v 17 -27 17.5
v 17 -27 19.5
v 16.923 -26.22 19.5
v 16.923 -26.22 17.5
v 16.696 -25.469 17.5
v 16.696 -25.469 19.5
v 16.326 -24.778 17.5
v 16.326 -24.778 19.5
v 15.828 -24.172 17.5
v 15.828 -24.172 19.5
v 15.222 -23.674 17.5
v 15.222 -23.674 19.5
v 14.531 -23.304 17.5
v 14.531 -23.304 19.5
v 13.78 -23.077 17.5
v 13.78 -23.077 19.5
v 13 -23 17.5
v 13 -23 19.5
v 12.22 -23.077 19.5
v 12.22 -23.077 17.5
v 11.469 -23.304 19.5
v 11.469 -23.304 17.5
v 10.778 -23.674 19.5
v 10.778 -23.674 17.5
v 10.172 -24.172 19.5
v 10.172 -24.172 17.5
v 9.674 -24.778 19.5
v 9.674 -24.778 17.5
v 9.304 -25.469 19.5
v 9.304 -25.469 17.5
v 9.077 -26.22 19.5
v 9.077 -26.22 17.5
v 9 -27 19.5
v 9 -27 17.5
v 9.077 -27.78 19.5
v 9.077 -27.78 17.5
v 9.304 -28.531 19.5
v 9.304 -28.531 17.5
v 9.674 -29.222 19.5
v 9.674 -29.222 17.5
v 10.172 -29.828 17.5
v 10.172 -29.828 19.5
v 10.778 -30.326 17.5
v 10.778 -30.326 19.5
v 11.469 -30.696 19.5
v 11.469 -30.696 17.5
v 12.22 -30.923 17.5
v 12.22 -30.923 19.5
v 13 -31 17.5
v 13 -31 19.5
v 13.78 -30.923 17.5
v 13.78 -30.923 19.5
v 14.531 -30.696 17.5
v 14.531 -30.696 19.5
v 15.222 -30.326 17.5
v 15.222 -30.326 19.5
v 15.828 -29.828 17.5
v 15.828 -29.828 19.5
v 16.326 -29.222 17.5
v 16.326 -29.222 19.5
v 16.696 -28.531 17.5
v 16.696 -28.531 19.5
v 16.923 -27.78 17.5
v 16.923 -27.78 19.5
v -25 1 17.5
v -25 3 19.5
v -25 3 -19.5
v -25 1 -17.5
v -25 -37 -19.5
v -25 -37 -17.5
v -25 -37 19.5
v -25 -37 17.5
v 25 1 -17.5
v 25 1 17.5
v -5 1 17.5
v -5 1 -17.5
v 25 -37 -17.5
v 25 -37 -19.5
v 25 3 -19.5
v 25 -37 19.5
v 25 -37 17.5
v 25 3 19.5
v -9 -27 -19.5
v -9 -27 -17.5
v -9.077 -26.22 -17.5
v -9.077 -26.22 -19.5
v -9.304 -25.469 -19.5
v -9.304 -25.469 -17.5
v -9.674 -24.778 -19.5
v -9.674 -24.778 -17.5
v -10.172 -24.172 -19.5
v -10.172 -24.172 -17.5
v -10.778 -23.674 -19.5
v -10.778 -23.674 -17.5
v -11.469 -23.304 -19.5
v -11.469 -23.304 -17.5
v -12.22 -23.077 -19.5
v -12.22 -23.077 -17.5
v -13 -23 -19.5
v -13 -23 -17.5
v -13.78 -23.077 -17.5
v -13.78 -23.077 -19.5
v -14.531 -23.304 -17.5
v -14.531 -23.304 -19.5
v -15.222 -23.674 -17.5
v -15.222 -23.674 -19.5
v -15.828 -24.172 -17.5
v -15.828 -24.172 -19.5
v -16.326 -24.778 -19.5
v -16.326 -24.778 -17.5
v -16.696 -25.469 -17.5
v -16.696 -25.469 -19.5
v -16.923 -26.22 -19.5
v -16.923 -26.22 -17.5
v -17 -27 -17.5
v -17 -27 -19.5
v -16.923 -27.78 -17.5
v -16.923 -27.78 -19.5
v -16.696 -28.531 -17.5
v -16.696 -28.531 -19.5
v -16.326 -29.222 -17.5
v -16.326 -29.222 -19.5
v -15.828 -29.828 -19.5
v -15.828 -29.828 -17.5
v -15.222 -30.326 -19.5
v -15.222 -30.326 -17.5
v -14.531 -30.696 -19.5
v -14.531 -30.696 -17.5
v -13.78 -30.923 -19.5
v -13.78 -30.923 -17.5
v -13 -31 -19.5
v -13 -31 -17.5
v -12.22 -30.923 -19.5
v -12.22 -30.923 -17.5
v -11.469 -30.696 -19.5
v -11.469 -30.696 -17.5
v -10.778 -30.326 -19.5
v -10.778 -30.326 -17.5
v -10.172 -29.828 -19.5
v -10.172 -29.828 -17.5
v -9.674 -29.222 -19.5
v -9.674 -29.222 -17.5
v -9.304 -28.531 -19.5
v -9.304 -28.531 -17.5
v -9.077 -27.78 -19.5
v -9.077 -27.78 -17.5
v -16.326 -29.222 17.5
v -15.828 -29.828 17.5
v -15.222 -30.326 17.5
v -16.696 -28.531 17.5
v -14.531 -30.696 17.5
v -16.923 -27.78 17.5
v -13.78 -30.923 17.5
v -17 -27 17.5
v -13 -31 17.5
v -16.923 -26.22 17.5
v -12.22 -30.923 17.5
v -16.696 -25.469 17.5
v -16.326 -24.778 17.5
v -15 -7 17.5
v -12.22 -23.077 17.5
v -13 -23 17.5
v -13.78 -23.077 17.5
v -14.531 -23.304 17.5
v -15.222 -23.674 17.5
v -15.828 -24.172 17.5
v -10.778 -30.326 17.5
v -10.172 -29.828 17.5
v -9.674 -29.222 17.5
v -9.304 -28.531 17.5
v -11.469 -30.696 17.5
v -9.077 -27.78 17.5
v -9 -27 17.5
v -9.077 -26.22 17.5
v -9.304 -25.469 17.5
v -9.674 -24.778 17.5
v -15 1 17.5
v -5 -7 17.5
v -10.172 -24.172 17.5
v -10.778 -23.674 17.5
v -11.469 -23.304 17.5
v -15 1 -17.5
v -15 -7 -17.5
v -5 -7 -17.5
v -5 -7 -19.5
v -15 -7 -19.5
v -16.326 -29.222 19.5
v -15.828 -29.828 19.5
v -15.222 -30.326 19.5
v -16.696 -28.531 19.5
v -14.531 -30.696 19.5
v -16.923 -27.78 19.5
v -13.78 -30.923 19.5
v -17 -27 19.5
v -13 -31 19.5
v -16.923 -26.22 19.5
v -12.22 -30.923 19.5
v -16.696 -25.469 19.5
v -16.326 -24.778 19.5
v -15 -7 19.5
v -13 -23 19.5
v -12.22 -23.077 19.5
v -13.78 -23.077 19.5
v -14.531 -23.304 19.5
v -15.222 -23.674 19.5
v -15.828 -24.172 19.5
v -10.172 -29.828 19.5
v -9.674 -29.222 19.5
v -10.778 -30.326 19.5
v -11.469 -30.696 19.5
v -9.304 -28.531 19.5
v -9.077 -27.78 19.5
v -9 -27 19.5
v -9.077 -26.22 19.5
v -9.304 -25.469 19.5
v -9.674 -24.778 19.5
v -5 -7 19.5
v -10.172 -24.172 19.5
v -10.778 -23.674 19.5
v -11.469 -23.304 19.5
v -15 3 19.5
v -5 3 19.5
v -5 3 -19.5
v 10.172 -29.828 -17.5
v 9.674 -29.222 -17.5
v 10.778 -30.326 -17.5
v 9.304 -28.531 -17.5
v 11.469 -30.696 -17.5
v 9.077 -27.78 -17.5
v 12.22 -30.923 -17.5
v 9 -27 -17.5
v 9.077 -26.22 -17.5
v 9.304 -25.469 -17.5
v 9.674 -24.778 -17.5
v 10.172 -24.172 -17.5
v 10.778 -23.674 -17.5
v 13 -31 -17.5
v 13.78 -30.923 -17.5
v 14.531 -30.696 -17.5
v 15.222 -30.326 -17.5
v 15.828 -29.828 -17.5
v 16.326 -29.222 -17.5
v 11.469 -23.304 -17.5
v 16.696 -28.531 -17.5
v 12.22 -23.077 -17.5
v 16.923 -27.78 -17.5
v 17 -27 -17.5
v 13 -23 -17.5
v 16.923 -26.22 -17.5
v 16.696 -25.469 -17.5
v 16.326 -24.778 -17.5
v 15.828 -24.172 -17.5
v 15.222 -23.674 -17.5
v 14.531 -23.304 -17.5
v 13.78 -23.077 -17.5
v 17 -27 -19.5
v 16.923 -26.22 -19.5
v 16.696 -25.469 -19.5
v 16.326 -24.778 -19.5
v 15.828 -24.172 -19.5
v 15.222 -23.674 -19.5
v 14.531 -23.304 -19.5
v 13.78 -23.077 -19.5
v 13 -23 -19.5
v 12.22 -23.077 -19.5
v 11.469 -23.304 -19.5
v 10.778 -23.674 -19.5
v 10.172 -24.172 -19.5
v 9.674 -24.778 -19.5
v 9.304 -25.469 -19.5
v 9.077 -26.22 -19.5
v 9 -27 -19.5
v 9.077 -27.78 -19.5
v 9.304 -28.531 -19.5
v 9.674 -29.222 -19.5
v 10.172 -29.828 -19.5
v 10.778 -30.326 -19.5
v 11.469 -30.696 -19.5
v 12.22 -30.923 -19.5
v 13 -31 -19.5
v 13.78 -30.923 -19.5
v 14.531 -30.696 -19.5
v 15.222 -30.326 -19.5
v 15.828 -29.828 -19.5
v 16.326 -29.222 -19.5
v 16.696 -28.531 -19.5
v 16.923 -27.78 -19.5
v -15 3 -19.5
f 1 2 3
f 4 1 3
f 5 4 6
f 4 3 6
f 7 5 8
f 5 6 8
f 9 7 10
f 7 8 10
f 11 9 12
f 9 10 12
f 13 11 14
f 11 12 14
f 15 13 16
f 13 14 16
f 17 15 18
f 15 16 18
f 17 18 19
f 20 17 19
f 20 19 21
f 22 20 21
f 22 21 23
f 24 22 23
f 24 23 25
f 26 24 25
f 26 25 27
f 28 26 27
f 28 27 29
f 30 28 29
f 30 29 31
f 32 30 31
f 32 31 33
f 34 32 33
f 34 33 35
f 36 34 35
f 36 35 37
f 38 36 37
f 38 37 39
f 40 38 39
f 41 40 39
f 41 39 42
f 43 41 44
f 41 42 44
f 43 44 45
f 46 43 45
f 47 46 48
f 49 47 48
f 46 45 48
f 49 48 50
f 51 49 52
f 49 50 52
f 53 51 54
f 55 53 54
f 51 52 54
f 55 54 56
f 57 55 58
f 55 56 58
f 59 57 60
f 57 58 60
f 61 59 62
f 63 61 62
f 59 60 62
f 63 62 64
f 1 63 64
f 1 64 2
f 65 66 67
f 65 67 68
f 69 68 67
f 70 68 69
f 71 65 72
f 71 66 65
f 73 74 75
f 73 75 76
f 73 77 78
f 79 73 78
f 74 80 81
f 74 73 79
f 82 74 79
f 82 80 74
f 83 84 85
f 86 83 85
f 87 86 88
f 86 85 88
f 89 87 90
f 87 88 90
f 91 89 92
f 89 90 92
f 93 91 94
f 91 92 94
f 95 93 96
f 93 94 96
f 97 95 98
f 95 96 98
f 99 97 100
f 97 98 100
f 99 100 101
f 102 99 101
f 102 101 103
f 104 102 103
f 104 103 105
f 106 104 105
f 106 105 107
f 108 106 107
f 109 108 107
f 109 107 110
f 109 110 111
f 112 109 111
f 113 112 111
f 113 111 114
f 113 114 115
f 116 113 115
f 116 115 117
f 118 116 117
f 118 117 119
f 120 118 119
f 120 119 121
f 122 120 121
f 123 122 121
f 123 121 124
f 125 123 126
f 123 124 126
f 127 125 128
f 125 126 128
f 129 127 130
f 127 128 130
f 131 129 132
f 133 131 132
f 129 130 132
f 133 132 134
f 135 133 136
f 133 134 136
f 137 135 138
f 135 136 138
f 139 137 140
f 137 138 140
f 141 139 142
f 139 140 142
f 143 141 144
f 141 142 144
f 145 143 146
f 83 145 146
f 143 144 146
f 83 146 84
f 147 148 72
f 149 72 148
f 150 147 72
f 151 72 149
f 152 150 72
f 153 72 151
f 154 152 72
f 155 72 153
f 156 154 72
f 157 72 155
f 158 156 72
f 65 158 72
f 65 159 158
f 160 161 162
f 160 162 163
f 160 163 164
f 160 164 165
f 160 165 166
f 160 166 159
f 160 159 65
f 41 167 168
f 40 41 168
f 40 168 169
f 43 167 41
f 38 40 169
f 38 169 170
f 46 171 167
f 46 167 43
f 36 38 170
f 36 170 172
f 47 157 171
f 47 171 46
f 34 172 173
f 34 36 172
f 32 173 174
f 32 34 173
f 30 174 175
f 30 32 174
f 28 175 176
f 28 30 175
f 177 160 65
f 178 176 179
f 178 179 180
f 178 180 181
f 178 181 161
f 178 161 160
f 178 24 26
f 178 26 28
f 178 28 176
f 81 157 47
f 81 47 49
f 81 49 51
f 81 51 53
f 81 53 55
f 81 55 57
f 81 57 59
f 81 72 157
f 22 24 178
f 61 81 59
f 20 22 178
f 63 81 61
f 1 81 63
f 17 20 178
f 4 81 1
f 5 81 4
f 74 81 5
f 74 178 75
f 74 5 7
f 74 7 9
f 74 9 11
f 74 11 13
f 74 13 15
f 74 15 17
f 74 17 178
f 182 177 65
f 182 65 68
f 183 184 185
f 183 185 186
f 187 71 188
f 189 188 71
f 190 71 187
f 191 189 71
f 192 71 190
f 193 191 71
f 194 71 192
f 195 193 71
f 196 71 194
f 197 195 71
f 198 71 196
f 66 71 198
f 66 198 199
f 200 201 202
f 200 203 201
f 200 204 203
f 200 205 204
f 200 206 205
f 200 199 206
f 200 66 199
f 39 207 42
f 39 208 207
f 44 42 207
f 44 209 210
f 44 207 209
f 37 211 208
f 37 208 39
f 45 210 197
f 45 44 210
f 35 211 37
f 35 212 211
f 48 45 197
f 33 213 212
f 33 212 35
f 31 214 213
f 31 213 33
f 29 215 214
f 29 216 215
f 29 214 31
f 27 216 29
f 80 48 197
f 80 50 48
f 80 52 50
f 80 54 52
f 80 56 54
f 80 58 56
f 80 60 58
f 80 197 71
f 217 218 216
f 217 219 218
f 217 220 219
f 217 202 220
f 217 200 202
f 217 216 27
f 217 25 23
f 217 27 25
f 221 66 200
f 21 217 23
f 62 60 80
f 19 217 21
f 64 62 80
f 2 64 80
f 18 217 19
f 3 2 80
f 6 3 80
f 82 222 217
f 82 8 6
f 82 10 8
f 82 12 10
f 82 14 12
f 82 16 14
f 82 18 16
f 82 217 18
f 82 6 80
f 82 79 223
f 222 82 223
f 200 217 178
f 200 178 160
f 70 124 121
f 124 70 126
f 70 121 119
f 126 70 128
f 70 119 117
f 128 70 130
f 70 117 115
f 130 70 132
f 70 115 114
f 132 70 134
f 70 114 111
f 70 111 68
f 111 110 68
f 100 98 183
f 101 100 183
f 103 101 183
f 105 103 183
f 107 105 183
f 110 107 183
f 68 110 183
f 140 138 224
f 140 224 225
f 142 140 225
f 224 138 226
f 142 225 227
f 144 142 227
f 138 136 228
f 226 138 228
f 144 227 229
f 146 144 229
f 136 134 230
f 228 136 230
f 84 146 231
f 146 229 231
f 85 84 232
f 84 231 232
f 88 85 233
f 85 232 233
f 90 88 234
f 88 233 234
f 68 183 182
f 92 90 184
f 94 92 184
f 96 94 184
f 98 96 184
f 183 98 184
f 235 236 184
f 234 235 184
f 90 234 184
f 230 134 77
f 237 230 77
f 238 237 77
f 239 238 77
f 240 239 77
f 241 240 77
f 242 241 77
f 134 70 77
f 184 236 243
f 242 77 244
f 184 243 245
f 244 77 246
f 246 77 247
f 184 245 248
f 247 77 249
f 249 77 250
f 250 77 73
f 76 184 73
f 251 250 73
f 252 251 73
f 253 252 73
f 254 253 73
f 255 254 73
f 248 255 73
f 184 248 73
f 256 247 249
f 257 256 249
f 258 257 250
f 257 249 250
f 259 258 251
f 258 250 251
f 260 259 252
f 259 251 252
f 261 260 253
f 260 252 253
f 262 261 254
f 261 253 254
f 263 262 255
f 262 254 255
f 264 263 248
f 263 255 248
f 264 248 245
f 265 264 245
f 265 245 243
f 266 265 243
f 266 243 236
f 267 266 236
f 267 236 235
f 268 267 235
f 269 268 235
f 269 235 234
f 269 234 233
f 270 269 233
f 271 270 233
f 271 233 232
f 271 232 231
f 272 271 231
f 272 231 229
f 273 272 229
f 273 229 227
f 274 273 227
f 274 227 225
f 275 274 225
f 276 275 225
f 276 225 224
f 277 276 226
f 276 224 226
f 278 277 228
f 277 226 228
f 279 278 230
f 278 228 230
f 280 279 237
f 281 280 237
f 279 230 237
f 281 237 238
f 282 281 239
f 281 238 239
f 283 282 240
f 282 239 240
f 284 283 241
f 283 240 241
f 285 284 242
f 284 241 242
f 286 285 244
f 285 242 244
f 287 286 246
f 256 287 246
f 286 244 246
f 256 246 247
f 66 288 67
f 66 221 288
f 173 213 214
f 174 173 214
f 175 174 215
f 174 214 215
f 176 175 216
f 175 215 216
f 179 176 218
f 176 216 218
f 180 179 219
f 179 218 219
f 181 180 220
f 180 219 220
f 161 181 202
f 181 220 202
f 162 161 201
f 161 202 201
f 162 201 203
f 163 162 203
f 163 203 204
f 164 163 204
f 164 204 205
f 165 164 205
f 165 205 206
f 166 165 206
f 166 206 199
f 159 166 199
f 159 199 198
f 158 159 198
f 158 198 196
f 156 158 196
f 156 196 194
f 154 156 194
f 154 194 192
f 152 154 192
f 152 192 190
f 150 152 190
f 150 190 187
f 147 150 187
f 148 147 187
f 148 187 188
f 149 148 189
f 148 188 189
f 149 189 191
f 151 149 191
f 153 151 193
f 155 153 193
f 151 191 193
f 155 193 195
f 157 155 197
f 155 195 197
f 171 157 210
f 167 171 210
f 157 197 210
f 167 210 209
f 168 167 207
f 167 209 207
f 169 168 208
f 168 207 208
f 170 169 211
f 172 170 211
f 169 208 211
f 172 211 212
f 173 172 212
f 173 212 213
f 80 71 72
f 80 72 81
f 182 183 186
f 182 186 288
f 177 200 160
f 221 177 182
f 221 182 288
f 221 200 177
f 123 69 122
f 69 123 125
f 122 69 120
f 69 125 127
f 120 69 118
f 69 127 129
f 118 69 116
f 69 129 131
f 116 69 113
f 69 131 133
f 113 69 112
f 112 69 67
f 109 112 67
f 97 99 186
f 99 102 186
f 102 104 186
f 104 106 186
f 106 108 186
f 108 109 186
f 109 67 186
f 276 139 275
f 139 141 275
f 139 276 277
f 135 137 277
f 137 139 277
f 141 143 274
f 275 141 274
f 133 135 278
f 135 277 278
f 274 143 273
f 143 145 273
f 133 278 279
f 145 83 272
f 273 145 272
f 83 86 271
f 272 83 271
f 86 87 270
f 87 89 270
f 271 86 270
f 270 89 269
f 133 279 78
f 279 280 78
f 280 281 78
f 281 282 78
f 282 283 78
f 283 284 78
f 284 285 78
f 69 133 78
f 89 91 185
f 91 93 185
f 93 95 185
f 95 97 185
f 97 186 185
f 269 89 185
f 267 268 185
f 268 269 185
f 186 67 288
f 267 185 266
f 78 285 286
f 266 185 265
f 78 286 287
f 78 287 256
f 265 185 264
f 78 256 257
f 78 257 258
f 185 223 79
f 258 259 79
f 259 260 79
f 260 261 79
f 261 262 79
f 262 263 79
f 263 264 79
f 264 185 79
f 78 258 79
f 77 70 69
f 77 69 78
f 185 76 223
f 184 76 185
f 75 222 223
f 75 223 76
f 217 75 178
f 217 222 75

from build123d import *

# Parameters (mm, degrees)
HEAD_W_DEPTH        = 19.5
HEAD_T_W            = 35
HEAD_T_H            = 38
CUT_EXTRUDE_1_DEPTH = 66.186271561
SKETCH_3_R          = 4
CUT_EXTRUDE_2_DEPTH = 60.287435431


with BuildPart() as part:
    # ｽｹｯﾁ1 → Head-W (new, symmetric)
    with BuildSketch(Plane.XY):
        Polygon((-25, -37), (25, -37), (25, 3), (-5, 3), (-5, -7), (-15, -7), (-15, 3), (-25, 3), align=None)
    extrude(amount=HEAD_W_DEPTH, both=True)

    # Head-t → ｶｯﾄ - 押し出し1 (cut, through all)
    with BuildSketch(Plane(origin=(25, 0, 0), x_dir=(0, 0, -1), z_dir=(1, 0, 0))):
        with Locations((0, -18)):
            Rectangle(HEAD_T_W, HEAD_T_H)
    extrude(amount=-CUT_EXTRUDE_1_DEPTH, mode=Mode.SUBTRACT)

    # ｽｹｯﾁ3 → ｶｯﾄ - 押し出し2 (cut, through all)
    with BuildSketch(Plane.XY.offset(19.5)):
        with Locations((-13, -27)):
            Circle(SKETCH_3_R)
        with Locations((13, -27)):
            Circle(SKETCH_3_R)
    extrude(amount=-CUT_EXTRUDE_2_DEPTH, mode=Mode.SUBTRACT)


solid = part.part
